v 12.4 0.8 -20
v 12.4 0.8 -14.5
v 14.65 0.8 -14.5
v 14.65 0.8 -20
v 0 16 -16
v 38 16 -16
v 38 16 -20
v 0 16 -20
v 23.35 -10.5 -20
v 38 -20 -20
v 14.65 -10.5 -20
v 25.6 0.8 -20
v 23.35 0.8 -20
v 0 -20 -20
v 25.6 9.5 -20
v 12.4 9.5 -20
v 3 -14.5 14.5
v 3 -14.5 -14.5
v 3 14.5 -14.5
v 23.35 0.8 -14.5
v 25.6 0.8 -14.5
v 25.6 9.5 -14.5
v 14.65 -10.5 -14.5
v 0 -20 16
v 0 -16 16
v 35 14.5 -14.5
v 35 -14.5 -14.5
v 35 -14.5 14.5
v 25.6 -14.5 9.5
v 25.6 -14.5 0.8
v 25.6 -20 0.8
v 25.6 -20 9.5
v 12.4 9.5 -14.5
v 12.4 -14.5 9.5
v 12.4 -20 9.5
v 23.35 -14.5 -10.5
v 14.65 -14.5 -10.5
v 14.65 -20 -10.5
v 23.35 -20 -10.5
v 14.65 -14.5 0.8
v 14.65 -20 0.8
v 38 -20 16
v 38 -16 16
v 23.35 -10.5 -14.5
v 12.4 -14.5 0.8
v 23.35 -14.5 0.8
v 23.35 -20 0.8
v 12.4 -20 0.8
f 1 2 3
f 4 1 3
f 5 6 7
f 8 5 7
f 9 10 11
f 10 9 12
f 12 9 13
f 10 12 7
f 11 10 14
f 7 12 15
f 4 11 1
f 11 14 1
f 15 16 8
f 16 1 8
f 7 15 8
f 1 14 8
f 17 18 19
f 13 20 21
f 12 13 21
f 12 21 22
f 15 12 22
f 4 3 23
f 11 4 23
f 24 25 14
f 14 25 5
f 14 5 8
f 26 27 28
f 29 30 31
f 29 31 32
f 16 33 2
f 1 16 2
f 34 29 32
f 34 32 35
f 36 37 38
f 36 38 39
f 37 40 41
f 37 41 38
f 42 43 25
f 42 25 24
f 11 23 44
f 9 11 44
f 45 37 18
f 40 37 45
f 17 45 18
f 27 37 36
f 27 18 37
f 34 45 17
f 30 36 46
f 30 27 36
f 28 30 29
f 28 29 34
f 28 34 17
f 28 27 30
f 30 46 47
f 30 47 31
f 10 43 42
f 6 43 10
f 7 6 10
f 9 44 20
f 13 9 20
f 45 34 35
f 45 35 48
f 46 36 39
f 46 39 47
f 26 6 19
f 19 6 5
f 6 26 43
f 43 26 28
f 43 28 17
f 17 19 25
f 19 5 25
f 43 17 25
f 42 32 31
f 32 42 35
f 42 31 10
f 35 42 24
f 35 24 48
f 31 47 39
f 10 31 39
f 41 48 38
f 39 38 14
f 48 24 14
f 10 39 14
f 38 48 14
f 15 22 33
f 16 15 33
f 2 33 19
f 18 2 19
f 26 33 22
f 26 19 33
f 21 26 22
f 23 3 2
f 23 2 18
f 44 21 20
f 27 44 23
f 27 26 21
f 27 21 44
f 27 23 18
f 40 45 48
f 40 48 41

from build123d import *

# Parameters (mm, degrees)
ESTRUSIONE_ESTRUSIONE1_DEPTH = 38
TAGLIO_ESTRUSIONE1_DEPTH     = 32
TAGLIO_ESTRUSIONE3_DEPTH     = 48.370877129
TAGLIO_ESTRUSIONE4_DEPTH     = 53.671149598
TAGLIO_ESTRUSIONE5_DEPTH     = 53.671149598


with BuildPart() as part:
    # Schizzo2 → Estrusione-Estrusione1 (new body)
    with BuildSketch(Plane(origin=(0, 0, 0), x_dir=(0, 0, -1), z_dir=(1, 0, 0))):
        Polygon((-20, -20), (20, -20), (20, 20), align=None)
    extrude(amount=ESTRUSIONE_ESTRUSIONE1_DEPTH)

    # Schizzo3 → Taglio-Estrusione1 (cut)
    with BuildSketch(Plane(origin=(35, 0, 0), x_dir=(0, 0, -1), z_dir=(1, 0, 0))):
        Polygon((-20, -14.5), (14.5, 20), (14.5, -14.5), align=None)
    extrude(amount=-TAGLIO_ESTRUSIONE1_DEPTH, mode=Mode.SUBTRACT)

    # Schizzo5 → Taglio-Estrusione3 (cut, through all)
    with BuildSketch(Plane(origin=(0, 0, 0), x_dir=(0, 0, -1), z_dir=(1, 0, 0))):
        Polygon((16, 16), (20, 16), (20, 20), align=None)
        Polygon((-20, -20), (-16, -16), (-16, -20), align=None)
    extrude(amount=TAGLIO_ESTRUSIONE3_DEPTH, mode=Mode.SUBTRACT)

    # Schizzo6 → Taglio-Estrusione4 (cut, through all)
    with BuildSketch(Plane.XY.offset(-14.5)):
        Polygon((25.6, 9.5), (12.4, 9.5), (12.4, 0.8), (14.65, 0.8), (14.65, -10.5), (23.35, -10.5), (23.35, 0.8), (25.6, 0.8), align=None)
    extrude(amount=-TAGLIO_ESTRUSIONE4_DEPTH, mode=Mode.SUBTRACT)

    # Schizzo8 → Taglio-Estrusione5 (cut, through all)
    with BuildSketch(Plane(origin=(0, -14.5, 0), x_dir=(1, 0, 0), z_dir=(0, 1, 0))):
        Polygon((25.6, -9.5), (12.4, -9.5), (12.4, -0.8), (14.65, -0.8), (14.65, 10.5), (23.35, 10.5), (23.35, -0.8), (25.6, -0.8), align=None)
    extrude(amount=-TAGLIO_ESTRUSIONE5_DEPTH, mode=Mode.SUBTRACT)


solid = part.part
